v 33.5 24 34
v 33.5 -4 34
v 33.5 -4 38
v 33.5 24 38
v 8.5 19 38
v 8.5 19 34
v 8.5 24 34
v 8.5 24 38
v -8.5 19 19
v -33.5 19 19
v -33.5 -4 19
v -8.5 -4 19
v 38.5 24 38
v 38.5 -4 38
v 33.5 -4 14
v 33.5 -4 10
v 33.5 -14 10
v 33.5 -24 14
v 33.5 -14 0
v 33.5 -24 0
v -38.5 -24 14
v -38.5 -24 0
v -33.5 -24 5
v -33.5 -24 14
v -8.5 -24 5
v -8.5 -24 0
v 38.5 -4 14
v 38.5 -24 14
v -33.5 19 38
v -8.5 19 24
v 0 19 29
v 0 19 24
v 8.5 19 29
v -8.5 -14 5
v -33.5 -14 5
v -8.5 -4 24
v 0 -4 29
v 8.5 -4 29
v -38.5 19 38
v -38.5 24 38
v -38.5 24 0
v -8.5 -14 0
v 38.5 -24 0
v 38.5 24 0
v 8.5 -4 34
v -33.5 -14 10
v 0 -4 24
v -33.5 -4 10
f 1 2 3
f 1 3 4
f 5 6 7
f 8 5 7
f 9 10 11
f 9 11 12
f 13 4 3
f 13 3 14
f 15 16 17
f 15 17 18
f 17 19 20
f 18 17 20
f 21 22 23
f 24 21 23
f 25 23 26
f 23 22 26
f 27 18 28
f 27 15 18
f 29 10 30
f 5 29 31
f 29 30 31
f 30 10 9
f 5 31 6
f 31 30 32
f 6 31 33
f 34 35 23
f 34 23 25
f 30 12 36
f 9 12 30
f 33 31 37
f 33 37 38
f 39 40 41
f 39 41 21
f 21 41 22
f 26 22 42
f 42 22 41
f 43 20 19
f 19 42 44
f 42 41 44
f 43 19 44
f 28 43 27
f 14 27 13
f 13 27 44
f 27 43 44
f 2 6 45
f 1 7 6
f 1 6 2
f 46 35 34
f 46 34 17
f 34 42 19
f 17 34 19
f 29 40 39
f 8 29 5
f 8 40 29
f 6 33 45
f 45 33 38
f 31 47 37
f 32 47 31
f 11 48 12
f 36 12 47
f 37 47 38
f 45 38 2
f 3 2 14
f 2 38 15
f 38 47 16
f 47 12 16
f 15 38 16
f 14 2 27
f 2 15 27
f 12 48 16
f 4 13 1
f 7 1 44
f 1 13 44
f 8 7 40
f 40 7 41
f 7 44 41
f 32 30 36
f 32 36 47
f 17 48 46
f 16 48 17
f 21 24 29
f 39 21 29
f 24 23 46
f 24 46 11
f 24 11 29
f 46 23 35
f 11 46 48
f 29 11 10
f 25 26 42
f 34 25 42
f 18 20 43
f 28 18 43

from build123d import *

# Parameters (mm, degrees)
F1_DEPTH  = 38
F3_DEPTH  = 25
F4_DEPTH  = 38
F0_W      = 5
F0_H      = 28
F5_DEPTH  = 38
F6_DEPTH  = 34
F7_DEPTH  = 14
F0_W_2    = 8.5
F0_H_2    = 23
F8_DEPTH  = 29
F9_DEPTH  = 24
F0_W_3    = 25
F10_DEPTH = 19
F11_DEPTH = 10
F0_H_3    = 10
F12_DEPTH = 5


with BuildPart() as f1:
    # F0 (on Top) → F1 (new body)
    with BuildSketch(Plane.XY):
        Polygon((-33.5, -24), (-33.5, -14), (-33.5, -4), (-33.5, 19), (-38.5, 19), (-38.5, -24), align=None)
    extrude(amount=F1_DEPTH)

    # F2 (on face) → F3 (cut)
    with BuildSketch(Plane.YZ.offset(-33.5)):
        Polygon((-24, 38), (-24, 14), (19, 38), align=None)
    extrude(amount=-F3_DEPTH, mode=Mode.SUBTRACT)

    # F0 (on Top) → F4 (join)
    with BuildSketch(Plane.XY):
        Polygon((8.5, 19), (8.5, 24), (-38.5, 24), (-38.5, 19), (-33.5, 19), (-8.5, 19), (0, 19), align=None)
    extrude(amount=F4_DEPTH)



with BuildPart() as f5:
    # F0 (on Top) → F5 (new body)
    with BuildSketch(Plane.XY):
        with Locations((36, 10)):
            Rectangle(F0_W, F0_H)
    extrude(amount=F5_DEPTH)


with BuildPart() as f1_1:
    add(f1.part)

    add(f5.part)  # F6 merges F5
    # F0 (on Top) → F6 (join)
    with BuildSketch(Plane.XY):
        Polygon((8.5, -4), (33.5, -4), (33.5, 24), (8.5, 24), (8.5, 19), align=None)
    extrude(amount=F6_DEPTH)

    # F0 (on Top) → F7 (join)
    with BuildSketch(Plane.XY):
        Polygon((33.5, -24), (38.5, -24), (38.5, -4), (33.5, -4), (33.5, -14), align=None)
    extrude(amount=F7_DEPTH)

    # F0 (on Top) → F8 (join)
    with BuildSketch(Plane.XY):
        with Locations((4.25, 7.5)):
            Rectangle(F0_W_2, F0_H_2)
    extrude(amount=F8_DEPTH)

    # F0 (on Top) → F9 (join)
    with BuildSketch(Plane.XY):
        with Locations((-4.25, 7.5)):
            Rectangle(F0_W_2, F0_H_2)
    extrude(amount=F9_DEPTH)

    # F0 (on Top) → F10 (join)
    with BuildSketch(Plane.XY):
        with Locations((-21, 7.5)):
            Rectangle(F0_W_3, F0_H_2)
    extrude(amount=F10_DEPTH)

    # F0 (on Top) → F11 (join)
    with BuildSketch(Plane.XY):
        Polygon((-8.5, -14), (33.5, -14), (33.5, -4), (8.5, -4), (0, -4), (-8.5, -4), (-33.5, -4), (-33.5, -14), align=None)
    extrude(amount=F11_DEPTH)

    # F0 (on Top) → F12 (join)
    with BuildSketch(Plane.XY):
        with Locations((-21, -19)):
            Rectangle(F0_W_3, F0_H_3)
    extrude(amount=F12_DEPTH)


solid = f1_1.part
